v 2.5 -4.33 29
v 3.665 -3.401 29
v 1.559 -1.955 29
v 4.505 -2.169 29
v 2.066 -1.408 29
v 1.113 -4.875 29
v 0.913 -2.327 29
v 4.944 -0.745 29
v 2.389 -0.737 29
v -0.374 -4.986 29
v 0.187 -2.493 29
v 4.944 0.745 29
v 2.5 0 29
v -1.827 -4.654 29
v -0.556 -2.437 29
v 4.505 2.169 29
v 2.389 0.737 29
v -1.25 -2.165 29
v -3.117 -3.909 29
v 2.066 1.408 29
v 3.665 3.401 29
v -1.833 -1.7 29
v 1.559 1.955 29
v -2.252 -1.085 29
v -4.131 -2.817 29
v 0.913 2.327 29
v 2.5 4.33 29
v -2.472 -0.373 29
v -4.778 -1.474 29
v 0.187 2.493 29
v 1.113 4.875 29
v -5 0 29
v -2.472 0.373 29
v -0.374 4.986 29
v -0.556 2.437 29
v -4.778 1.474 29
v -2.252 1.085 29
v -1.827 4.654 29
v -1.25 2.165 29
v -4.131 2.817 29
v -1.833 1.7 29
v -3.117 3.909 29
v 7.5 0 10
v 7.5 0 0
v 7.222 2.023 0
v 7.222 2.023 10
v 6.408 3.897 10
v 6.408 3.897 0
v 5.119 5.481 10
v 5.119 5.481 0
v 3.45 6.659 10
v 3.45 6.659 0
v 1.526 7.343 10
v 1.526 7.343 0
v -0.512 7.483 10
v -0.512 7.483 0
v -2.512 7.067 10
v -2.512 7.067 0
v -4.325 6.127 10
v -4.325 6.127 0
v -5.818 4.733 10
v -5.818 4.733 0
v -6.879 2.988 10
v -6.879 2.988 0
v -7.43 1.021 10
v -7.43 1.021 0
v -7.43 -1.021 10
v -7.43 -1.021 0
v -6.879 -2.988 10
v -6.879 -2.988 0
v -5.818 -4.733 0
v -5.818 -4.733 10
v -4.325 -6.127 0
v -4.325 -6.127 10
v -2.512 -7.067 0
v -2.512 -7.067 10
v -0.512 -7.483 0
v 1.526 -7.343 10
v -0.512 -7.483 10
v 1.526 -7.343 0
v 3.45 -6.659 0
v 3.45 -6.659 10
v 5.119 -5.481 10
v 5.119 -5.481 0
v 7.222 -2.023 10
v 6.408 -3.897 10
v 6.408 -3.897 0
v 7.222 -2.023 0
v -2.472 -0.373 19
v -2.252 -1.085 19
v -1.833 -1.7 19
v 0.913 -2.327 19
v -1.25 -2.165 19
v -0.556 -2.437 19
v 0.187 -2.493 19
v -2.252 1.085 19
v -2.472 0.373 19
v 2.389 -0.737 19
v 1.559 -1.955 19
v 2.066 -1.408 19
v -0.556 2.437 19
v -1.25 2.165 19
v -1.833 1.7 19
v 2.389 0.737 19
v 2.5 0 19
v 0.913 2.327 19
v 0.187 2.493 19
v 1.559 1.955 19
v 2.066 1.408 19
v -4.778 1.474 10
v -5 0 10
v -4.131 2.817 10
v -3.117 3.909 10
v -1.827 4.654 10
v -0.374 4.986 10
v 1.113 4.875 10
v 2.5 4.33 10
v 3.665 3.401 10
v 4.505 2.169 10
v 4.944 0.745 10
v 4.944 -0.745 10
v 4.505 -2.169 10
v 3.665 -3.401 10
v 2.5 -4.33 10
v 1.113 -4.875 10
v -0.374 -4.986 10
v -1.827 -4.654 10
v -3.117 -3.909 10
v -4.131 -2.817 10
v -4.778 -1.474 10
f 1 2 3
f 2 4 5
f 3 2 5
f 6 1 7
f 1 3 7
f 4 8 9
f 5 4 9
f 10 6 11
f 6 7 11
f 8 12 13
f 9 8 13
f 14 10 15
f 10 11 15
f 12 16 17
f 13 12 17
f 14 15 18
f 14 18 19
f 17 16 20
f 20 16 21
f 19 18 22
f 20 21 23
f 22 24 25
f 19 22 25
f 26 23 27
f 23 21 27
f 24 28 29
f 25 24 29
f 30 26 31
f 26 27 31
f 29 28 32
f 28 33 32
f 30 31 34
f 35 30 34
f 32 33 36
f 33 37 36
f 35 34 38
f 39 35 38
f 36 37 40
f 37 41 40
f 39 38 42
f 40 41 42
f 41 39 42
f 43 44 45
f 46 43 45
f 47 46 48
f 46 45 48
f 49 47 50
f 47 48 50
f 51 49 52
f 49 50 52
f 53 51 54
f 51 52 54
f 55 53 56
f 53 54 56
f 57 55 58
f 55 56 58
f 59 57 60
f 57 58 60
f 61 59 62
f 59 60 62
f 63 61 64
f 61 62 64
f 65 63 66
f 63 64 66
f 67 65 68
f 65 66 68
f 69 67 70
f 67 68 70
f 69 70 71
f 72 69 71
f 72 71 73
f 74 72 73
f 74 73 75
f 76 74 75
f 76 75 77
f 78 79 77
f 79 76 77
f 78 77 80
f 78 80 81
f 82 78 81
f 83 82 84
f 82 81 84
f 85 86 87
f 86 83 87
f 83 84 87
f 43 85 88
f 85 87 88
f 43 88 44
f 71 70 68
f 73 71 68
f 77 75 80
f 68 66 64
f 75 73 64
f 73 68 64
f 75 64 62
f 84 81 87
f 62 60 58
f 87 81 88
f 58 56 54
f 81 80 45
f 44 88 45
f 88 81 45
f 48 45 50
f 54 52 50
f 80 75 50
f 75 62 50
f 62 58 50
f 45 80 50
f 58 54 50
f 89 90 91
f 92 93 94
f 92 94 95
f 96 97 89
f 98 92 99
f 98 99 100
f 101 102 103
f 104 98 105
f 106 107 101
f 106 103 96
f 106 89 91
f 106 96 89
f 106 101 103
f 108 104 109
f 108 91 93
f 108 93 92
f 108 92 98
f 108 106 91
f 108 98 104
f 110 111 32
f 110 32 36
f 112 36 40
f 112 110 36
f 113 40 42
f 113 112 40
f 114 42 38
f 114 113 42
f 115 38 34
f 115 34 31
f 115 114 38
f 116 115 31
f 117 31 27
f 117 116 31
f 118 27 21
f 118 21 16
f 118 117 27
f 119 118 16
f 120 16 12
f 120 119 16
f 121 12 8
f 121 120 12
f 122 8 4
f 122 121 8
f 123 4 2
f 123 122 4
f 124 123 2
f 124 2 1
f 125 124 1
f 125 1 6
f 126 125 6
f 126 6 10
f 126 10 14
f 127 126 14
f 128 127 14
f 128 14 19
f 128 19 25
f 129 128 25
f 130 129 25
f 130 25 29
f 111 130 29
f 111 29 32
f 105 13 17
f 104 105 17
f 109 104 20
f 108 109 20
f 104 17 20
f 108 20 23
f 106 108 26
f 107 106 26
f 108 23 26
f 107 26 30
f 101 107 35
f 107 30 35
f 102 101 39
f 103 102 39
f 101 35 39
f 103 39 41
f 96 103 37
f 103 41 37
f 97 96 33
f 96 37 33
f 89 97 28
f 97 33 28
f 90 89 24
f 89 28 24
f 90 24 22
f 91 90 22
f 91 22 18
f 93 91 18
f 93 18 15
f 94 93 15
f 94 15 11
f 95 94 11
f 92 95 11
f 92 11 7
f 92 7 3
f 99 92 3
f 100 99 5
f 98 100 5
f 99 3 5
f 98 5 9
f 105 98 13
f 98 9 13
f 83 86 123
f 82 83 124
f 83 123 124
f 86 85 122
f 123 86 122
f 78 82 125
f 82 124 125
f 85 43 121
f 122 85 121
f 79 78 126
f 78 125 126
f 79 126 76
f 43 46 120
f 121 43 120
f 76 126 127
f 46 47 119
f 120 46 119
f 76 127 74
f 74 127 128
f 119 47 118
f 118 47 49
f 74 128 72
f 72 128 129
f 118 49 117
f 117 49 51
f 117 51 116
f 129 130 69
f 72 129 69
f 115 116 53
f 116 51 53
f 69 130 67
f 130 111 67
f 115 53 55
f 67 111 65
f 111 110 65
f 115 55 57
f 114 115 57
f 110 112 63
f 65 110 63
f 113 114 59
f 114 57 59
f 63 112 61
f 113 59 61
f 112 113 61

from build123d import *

# Parameters (mm, degrees)
SKETCH1_R           = 7.5
BOSS_EXTRUDE1_DEPTH = 250
SKETCH2_R           = 5
CUT_EXTRUDE1_DEPTH  = 10
SKETCH3_R           = 9.435011435
SKETCH3_R_2         = 5
CUT_EXTRUDE2_DEPTH  = 19
SKETCH5_R           = 25.765699078
CUT_EXTRUDE3_DEPTH  = 221
SKETCH6_R           = 6.015267085
BOSS_EXTRUDE2_DEPTH = 10
SKETCH7_R           = 2.5
CUT_EXTRUDE4_DEPTH  = 10


with BuildPart() as part:
    # Sketch1 → Boss-Extrude1 (new body)
    with BuildSketch(Plane.XY):
        Circle(SKETCH1_R)
    extrude(amount=BOSS_EXTRUDE1_DEPTH)

    # Sketch2 → Cut-Extrude1 (cut)
    with BuildSketch(Plane.XY):
        Circle(SKETCH2_R)
    extrude(amount=CUT_EXTRUDE1_DEPTH, mode=Mode.SUBTRACT)

    # Sketch3 → Cut-Extrude2 (cut)
    with BuildSketch(Plane(origin=(0, 0, 10), x_dir=(-1, 0, 0), z_dir=(0, 0, -1))):
        Circle(SKETCH3_R)
        Circle(SKETCH3_R_2, mode=Mode.SUBTRACT)
    extrude(amount=-CUT_EXTRUDE2_DEPTH, mode=Mode.SUBTRACT)


with BuildPart() as cut_extrude2_piece_1:
    # of the separate pieces the step leaves, piece 1, a body of its own (cut_extrude2_pieces)
    add(part.part.solids().sort_by_distance((7.5, 0, 29))[0])

    # Sketch5 → Cut-Extrude3 (cut)
    with BuildSketch(Plane(origin=(0, 0, 29), x_dir=(-1, 0, 0), z_dir=(0, 0, -1))):
        Circle(SKETCH5_R)
    extrude(amount=-CUT_EXTRUDE3_DEPTH, mode=Mode.SUBTRACT)



with BuildPart() as cut_extrude2_piece_2:
    # of the separate pieces the step leaves, piece 2, a body of its own (cut_extrude2_pieces)
    add(part.part.solids().sort_by_distance((7.5, 0, 0))[0])


with BuildPart() as cut_extrude2_piece_1_1:
    add(cut_extrude2_piece_1.part)

    add(cut_extrude2_piece_2.part)  # Boss-Extrude2 merges Cut-Extrude2 piece 2
    # Sketch6 → Boss-Extrude2 (add)
    with BuildSketch(Plane(origin=(0, 0, 10), x_dir=(-1, 0, 0), z_dir=(0, 0, -1))):
        Circle(SKETCH6_R)
    extrude(amount=BOSS_EXTRUDE2_DEPTH)

    # Sketch7 → Cut-Extrude4 (cut)
    with BuildSketch(Plane.XY.offset(29)):
        Circle(SKETCH7_R)
    extrude(amount=-CUT_EXTRUDE4_DEPTH, mode=Mode.SUBTRACT)


solid = cut_extrude2_piece_1_1.part
